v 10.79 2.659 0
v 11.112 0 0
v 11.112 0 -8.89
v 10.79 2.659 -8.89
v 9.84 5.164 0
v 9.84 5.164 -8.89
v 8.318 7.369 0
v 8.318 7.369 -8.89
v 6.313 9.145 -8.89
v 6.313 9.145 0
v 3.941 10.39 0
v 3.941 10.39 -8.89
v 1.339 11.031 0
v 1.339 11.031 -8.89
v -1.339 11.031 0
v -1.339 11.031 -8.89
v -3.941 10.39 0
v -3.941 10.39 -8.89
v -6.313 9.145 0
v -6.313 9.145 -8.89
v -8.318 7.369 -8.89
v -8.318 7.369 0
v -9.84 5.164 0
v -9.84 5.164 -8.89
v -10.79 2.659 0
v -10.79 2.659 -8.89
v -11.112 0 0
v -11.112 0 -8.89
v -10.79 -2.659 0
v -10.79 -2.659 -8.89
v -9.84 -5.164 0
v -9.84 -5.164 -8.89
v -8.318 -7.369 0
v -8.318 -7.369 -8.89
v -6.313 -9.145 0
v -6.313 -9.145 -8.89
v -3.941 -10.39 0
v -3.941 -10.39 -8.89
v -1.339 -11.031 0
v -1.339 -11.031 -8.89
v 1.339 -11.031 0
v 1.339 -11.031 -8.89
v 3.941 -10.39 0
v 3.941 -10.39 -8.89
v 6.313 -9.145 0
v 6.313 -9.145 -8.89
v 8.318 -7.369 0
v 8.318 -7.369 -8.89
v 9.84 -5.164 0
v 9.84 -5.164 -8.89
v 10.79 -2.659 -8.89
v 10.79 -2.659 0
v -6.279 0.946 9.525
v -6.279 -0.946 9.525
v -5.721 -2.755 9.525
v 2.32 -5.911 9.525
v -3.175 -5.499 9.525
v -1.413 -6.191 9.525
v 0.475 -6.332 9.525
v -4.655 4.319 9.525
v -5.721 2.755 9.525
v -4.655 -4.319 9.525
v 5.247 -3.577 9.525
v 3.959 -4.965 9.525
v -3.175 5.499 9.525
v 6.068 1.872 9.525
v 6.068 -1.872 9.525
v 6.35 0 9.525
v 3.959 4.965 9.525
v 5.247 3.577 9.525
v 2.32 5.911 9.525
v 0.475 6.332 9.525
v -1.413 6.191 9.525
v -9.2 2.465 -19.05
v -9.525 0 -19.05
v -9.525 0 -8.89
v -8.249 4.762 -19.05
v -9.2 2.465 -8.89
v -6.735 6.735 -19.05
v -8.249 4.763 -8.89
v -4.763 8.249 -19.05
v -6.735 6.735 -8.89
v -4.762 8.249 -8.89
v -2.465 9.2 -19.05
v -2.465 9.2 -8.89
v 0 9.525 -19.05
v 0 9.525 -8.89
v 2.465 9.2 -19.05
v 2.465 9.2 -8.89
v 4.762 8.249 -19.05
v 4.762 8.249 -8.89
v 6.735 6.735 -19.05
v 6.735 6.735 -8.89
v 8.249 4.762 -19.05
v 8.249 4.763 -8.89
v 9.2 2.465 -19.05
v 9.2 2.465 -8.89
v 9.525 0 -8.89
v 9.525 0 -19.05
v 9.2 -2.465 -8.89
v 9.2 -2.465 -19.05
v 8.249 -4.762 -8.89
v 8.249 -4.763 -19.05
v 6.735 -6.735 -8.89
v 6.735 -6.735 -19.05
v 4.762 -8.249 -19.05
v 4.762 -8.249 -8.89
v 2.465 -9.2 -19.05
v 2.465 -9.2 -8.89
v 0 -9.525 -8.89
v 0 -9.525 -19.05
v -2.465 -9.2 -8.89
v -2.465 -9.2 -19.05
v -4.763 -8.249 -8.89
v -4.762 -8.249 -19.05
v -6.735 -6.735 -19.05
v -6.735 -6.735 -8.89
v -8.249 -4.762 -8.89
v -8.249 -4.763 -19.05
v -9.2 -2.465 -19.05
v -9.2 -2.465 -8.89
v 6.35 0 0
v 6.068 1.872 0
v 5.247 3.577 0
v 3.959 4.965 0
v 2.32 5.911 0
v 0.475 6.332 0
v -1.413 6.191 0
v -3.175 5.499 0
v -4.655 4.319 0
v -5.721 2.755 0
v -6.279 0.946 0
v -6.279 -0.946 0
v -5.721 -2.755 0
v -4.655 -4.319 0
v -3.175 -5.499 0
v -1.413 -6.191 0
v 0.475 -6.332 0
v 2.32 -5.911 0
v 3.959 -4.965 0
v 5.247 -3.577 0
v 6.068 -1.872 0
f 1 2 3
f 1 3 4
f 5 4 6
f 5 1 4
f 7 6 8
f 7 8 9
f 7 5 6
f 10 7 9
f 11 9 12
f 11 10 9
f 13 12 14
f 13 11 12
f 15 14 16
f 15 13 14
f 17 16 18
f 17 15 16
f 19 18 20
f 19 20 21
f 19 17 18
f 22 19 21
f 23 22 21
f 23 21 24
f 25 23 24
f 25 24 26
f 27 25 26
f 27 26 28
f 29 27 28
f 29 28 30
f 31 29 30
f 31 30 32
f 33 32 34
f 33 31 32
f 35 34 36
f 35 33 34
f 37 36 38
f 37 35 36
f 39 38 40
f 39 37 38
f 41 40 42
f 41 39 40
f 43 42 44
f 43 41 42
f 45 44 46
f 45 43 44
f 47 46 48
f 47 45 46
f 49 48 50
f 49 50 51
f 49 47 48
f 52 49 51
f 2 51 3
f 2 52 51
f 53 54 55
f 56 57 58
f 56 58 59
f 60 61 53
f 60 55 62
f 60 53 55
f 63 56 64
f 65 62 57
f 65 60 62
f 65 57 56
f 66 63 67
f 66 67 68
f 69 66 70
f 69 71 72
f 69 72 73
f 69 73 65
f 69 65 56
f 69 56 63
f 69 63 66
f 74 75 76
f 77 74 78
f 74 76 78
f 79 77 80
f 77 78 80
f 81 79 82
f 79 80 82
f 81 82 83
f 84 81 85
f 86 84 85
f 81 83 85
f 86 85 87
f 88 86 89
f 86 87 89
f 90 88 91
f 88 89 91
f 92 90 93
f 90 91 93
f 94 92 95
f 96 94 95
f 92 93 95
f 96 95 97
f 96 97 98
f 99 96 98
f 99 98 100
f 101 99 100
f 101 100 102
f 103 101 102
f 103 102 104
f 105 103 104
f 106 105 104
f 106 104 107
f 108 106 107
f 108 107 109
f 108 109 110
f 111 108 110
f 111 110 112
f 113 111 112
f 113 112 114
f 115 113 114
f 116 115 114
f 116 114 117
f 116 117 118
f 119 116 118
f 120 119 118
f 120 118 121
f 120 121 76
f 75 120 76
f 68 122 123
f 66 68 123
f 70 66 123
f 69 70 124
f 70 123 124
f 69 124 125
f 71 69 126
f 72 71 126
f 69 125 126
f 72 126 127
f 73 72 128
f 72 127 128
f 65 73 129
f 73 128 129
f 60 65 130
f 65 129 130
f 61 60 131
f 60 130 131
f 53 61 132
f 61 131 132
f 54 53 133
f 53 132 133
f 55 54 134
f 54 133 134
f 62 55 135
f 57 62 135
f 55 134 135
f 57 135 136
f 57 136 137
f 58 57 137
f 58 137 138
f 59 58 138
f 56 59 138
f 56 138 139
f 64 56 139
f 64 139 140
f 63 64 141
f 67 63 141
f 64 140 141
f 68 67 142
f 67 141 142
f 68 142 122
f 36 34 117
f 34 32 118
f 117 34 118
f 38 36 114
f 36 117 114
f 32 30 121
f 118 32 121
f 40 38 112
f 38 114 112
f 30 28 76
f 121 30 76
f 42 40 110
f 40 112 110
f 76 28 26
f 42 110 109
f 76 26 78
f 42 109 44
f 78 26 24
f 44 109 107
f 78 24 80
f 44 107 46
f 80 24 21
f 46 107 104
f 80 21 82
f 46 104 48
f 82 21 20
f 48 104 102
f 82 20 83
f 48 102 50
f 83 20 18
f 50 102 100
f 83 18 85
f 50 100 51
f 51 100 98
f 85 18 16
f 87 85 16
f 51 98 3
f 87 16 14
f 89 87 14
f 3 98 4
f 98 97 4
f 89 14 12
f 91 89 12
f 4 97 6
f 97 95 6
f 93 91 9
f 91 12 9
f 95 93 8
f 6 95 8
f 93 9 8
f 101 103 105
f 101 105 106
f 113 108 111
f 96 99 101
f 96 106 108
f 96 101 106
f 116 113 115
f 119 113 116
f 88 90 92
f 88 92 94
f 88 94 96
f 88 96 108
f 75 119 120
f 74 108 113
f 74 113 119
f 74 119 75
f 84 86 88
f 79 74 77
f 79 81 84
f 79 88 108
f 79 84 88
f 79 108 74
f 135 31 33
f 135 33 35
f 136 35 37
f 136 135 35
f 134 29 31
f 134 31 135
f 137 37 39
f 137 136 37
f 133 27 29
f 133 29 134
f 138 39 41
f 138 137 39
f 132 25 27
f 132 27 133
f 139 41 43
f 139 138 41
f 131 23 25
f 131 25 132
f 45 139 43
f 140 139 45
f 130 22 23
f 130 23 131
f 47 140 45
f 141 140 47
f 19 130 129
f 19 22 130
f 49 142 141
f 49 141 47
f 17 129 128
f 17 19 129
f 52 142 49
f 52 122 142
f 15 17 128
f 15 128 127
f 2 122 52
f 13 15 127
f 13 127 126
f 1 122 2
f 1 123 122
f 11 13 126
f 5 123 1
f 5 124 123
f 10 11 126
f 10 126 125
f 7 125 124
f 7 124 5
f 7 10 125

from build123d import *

# Parameters (mm, degrees)
SKETCH1_R      = 6.35
EXTRUDE1_DEPTH = 9.525
SKETCH2_R      = 9.525
EXTRUDE2_DEPTH = 19.05
SKETCH3_R      = 11.1125
EXTRUDE3_DEPTH = 8.89


with BuildPart() as part:
    # Sketch1 → Extrude1 (new body)
    with BuildSketch(Plane.XY):
        Circle(SKETCH1_R)
    extrude(amount=EXTRUDE1_DEPTH)

    # Sketch2 → Extrude2 (add)
    with BuildSketch(Plane(origin=(0, 0, 0), x_dir=(-1, 0, 0), z_dir=(0, 0, -1))):
        Circle(SKETCH2_R)
    extrude(amount=EXTRUDE2_DEPTH)

    # Sketch3 → Extrude3 (add)
    with BuildSketch(Plane.XY):
        Circle(SKETCH3_R)
    extrude(amount=-EXTRUDE3_DEPTH)


solid = part.part
